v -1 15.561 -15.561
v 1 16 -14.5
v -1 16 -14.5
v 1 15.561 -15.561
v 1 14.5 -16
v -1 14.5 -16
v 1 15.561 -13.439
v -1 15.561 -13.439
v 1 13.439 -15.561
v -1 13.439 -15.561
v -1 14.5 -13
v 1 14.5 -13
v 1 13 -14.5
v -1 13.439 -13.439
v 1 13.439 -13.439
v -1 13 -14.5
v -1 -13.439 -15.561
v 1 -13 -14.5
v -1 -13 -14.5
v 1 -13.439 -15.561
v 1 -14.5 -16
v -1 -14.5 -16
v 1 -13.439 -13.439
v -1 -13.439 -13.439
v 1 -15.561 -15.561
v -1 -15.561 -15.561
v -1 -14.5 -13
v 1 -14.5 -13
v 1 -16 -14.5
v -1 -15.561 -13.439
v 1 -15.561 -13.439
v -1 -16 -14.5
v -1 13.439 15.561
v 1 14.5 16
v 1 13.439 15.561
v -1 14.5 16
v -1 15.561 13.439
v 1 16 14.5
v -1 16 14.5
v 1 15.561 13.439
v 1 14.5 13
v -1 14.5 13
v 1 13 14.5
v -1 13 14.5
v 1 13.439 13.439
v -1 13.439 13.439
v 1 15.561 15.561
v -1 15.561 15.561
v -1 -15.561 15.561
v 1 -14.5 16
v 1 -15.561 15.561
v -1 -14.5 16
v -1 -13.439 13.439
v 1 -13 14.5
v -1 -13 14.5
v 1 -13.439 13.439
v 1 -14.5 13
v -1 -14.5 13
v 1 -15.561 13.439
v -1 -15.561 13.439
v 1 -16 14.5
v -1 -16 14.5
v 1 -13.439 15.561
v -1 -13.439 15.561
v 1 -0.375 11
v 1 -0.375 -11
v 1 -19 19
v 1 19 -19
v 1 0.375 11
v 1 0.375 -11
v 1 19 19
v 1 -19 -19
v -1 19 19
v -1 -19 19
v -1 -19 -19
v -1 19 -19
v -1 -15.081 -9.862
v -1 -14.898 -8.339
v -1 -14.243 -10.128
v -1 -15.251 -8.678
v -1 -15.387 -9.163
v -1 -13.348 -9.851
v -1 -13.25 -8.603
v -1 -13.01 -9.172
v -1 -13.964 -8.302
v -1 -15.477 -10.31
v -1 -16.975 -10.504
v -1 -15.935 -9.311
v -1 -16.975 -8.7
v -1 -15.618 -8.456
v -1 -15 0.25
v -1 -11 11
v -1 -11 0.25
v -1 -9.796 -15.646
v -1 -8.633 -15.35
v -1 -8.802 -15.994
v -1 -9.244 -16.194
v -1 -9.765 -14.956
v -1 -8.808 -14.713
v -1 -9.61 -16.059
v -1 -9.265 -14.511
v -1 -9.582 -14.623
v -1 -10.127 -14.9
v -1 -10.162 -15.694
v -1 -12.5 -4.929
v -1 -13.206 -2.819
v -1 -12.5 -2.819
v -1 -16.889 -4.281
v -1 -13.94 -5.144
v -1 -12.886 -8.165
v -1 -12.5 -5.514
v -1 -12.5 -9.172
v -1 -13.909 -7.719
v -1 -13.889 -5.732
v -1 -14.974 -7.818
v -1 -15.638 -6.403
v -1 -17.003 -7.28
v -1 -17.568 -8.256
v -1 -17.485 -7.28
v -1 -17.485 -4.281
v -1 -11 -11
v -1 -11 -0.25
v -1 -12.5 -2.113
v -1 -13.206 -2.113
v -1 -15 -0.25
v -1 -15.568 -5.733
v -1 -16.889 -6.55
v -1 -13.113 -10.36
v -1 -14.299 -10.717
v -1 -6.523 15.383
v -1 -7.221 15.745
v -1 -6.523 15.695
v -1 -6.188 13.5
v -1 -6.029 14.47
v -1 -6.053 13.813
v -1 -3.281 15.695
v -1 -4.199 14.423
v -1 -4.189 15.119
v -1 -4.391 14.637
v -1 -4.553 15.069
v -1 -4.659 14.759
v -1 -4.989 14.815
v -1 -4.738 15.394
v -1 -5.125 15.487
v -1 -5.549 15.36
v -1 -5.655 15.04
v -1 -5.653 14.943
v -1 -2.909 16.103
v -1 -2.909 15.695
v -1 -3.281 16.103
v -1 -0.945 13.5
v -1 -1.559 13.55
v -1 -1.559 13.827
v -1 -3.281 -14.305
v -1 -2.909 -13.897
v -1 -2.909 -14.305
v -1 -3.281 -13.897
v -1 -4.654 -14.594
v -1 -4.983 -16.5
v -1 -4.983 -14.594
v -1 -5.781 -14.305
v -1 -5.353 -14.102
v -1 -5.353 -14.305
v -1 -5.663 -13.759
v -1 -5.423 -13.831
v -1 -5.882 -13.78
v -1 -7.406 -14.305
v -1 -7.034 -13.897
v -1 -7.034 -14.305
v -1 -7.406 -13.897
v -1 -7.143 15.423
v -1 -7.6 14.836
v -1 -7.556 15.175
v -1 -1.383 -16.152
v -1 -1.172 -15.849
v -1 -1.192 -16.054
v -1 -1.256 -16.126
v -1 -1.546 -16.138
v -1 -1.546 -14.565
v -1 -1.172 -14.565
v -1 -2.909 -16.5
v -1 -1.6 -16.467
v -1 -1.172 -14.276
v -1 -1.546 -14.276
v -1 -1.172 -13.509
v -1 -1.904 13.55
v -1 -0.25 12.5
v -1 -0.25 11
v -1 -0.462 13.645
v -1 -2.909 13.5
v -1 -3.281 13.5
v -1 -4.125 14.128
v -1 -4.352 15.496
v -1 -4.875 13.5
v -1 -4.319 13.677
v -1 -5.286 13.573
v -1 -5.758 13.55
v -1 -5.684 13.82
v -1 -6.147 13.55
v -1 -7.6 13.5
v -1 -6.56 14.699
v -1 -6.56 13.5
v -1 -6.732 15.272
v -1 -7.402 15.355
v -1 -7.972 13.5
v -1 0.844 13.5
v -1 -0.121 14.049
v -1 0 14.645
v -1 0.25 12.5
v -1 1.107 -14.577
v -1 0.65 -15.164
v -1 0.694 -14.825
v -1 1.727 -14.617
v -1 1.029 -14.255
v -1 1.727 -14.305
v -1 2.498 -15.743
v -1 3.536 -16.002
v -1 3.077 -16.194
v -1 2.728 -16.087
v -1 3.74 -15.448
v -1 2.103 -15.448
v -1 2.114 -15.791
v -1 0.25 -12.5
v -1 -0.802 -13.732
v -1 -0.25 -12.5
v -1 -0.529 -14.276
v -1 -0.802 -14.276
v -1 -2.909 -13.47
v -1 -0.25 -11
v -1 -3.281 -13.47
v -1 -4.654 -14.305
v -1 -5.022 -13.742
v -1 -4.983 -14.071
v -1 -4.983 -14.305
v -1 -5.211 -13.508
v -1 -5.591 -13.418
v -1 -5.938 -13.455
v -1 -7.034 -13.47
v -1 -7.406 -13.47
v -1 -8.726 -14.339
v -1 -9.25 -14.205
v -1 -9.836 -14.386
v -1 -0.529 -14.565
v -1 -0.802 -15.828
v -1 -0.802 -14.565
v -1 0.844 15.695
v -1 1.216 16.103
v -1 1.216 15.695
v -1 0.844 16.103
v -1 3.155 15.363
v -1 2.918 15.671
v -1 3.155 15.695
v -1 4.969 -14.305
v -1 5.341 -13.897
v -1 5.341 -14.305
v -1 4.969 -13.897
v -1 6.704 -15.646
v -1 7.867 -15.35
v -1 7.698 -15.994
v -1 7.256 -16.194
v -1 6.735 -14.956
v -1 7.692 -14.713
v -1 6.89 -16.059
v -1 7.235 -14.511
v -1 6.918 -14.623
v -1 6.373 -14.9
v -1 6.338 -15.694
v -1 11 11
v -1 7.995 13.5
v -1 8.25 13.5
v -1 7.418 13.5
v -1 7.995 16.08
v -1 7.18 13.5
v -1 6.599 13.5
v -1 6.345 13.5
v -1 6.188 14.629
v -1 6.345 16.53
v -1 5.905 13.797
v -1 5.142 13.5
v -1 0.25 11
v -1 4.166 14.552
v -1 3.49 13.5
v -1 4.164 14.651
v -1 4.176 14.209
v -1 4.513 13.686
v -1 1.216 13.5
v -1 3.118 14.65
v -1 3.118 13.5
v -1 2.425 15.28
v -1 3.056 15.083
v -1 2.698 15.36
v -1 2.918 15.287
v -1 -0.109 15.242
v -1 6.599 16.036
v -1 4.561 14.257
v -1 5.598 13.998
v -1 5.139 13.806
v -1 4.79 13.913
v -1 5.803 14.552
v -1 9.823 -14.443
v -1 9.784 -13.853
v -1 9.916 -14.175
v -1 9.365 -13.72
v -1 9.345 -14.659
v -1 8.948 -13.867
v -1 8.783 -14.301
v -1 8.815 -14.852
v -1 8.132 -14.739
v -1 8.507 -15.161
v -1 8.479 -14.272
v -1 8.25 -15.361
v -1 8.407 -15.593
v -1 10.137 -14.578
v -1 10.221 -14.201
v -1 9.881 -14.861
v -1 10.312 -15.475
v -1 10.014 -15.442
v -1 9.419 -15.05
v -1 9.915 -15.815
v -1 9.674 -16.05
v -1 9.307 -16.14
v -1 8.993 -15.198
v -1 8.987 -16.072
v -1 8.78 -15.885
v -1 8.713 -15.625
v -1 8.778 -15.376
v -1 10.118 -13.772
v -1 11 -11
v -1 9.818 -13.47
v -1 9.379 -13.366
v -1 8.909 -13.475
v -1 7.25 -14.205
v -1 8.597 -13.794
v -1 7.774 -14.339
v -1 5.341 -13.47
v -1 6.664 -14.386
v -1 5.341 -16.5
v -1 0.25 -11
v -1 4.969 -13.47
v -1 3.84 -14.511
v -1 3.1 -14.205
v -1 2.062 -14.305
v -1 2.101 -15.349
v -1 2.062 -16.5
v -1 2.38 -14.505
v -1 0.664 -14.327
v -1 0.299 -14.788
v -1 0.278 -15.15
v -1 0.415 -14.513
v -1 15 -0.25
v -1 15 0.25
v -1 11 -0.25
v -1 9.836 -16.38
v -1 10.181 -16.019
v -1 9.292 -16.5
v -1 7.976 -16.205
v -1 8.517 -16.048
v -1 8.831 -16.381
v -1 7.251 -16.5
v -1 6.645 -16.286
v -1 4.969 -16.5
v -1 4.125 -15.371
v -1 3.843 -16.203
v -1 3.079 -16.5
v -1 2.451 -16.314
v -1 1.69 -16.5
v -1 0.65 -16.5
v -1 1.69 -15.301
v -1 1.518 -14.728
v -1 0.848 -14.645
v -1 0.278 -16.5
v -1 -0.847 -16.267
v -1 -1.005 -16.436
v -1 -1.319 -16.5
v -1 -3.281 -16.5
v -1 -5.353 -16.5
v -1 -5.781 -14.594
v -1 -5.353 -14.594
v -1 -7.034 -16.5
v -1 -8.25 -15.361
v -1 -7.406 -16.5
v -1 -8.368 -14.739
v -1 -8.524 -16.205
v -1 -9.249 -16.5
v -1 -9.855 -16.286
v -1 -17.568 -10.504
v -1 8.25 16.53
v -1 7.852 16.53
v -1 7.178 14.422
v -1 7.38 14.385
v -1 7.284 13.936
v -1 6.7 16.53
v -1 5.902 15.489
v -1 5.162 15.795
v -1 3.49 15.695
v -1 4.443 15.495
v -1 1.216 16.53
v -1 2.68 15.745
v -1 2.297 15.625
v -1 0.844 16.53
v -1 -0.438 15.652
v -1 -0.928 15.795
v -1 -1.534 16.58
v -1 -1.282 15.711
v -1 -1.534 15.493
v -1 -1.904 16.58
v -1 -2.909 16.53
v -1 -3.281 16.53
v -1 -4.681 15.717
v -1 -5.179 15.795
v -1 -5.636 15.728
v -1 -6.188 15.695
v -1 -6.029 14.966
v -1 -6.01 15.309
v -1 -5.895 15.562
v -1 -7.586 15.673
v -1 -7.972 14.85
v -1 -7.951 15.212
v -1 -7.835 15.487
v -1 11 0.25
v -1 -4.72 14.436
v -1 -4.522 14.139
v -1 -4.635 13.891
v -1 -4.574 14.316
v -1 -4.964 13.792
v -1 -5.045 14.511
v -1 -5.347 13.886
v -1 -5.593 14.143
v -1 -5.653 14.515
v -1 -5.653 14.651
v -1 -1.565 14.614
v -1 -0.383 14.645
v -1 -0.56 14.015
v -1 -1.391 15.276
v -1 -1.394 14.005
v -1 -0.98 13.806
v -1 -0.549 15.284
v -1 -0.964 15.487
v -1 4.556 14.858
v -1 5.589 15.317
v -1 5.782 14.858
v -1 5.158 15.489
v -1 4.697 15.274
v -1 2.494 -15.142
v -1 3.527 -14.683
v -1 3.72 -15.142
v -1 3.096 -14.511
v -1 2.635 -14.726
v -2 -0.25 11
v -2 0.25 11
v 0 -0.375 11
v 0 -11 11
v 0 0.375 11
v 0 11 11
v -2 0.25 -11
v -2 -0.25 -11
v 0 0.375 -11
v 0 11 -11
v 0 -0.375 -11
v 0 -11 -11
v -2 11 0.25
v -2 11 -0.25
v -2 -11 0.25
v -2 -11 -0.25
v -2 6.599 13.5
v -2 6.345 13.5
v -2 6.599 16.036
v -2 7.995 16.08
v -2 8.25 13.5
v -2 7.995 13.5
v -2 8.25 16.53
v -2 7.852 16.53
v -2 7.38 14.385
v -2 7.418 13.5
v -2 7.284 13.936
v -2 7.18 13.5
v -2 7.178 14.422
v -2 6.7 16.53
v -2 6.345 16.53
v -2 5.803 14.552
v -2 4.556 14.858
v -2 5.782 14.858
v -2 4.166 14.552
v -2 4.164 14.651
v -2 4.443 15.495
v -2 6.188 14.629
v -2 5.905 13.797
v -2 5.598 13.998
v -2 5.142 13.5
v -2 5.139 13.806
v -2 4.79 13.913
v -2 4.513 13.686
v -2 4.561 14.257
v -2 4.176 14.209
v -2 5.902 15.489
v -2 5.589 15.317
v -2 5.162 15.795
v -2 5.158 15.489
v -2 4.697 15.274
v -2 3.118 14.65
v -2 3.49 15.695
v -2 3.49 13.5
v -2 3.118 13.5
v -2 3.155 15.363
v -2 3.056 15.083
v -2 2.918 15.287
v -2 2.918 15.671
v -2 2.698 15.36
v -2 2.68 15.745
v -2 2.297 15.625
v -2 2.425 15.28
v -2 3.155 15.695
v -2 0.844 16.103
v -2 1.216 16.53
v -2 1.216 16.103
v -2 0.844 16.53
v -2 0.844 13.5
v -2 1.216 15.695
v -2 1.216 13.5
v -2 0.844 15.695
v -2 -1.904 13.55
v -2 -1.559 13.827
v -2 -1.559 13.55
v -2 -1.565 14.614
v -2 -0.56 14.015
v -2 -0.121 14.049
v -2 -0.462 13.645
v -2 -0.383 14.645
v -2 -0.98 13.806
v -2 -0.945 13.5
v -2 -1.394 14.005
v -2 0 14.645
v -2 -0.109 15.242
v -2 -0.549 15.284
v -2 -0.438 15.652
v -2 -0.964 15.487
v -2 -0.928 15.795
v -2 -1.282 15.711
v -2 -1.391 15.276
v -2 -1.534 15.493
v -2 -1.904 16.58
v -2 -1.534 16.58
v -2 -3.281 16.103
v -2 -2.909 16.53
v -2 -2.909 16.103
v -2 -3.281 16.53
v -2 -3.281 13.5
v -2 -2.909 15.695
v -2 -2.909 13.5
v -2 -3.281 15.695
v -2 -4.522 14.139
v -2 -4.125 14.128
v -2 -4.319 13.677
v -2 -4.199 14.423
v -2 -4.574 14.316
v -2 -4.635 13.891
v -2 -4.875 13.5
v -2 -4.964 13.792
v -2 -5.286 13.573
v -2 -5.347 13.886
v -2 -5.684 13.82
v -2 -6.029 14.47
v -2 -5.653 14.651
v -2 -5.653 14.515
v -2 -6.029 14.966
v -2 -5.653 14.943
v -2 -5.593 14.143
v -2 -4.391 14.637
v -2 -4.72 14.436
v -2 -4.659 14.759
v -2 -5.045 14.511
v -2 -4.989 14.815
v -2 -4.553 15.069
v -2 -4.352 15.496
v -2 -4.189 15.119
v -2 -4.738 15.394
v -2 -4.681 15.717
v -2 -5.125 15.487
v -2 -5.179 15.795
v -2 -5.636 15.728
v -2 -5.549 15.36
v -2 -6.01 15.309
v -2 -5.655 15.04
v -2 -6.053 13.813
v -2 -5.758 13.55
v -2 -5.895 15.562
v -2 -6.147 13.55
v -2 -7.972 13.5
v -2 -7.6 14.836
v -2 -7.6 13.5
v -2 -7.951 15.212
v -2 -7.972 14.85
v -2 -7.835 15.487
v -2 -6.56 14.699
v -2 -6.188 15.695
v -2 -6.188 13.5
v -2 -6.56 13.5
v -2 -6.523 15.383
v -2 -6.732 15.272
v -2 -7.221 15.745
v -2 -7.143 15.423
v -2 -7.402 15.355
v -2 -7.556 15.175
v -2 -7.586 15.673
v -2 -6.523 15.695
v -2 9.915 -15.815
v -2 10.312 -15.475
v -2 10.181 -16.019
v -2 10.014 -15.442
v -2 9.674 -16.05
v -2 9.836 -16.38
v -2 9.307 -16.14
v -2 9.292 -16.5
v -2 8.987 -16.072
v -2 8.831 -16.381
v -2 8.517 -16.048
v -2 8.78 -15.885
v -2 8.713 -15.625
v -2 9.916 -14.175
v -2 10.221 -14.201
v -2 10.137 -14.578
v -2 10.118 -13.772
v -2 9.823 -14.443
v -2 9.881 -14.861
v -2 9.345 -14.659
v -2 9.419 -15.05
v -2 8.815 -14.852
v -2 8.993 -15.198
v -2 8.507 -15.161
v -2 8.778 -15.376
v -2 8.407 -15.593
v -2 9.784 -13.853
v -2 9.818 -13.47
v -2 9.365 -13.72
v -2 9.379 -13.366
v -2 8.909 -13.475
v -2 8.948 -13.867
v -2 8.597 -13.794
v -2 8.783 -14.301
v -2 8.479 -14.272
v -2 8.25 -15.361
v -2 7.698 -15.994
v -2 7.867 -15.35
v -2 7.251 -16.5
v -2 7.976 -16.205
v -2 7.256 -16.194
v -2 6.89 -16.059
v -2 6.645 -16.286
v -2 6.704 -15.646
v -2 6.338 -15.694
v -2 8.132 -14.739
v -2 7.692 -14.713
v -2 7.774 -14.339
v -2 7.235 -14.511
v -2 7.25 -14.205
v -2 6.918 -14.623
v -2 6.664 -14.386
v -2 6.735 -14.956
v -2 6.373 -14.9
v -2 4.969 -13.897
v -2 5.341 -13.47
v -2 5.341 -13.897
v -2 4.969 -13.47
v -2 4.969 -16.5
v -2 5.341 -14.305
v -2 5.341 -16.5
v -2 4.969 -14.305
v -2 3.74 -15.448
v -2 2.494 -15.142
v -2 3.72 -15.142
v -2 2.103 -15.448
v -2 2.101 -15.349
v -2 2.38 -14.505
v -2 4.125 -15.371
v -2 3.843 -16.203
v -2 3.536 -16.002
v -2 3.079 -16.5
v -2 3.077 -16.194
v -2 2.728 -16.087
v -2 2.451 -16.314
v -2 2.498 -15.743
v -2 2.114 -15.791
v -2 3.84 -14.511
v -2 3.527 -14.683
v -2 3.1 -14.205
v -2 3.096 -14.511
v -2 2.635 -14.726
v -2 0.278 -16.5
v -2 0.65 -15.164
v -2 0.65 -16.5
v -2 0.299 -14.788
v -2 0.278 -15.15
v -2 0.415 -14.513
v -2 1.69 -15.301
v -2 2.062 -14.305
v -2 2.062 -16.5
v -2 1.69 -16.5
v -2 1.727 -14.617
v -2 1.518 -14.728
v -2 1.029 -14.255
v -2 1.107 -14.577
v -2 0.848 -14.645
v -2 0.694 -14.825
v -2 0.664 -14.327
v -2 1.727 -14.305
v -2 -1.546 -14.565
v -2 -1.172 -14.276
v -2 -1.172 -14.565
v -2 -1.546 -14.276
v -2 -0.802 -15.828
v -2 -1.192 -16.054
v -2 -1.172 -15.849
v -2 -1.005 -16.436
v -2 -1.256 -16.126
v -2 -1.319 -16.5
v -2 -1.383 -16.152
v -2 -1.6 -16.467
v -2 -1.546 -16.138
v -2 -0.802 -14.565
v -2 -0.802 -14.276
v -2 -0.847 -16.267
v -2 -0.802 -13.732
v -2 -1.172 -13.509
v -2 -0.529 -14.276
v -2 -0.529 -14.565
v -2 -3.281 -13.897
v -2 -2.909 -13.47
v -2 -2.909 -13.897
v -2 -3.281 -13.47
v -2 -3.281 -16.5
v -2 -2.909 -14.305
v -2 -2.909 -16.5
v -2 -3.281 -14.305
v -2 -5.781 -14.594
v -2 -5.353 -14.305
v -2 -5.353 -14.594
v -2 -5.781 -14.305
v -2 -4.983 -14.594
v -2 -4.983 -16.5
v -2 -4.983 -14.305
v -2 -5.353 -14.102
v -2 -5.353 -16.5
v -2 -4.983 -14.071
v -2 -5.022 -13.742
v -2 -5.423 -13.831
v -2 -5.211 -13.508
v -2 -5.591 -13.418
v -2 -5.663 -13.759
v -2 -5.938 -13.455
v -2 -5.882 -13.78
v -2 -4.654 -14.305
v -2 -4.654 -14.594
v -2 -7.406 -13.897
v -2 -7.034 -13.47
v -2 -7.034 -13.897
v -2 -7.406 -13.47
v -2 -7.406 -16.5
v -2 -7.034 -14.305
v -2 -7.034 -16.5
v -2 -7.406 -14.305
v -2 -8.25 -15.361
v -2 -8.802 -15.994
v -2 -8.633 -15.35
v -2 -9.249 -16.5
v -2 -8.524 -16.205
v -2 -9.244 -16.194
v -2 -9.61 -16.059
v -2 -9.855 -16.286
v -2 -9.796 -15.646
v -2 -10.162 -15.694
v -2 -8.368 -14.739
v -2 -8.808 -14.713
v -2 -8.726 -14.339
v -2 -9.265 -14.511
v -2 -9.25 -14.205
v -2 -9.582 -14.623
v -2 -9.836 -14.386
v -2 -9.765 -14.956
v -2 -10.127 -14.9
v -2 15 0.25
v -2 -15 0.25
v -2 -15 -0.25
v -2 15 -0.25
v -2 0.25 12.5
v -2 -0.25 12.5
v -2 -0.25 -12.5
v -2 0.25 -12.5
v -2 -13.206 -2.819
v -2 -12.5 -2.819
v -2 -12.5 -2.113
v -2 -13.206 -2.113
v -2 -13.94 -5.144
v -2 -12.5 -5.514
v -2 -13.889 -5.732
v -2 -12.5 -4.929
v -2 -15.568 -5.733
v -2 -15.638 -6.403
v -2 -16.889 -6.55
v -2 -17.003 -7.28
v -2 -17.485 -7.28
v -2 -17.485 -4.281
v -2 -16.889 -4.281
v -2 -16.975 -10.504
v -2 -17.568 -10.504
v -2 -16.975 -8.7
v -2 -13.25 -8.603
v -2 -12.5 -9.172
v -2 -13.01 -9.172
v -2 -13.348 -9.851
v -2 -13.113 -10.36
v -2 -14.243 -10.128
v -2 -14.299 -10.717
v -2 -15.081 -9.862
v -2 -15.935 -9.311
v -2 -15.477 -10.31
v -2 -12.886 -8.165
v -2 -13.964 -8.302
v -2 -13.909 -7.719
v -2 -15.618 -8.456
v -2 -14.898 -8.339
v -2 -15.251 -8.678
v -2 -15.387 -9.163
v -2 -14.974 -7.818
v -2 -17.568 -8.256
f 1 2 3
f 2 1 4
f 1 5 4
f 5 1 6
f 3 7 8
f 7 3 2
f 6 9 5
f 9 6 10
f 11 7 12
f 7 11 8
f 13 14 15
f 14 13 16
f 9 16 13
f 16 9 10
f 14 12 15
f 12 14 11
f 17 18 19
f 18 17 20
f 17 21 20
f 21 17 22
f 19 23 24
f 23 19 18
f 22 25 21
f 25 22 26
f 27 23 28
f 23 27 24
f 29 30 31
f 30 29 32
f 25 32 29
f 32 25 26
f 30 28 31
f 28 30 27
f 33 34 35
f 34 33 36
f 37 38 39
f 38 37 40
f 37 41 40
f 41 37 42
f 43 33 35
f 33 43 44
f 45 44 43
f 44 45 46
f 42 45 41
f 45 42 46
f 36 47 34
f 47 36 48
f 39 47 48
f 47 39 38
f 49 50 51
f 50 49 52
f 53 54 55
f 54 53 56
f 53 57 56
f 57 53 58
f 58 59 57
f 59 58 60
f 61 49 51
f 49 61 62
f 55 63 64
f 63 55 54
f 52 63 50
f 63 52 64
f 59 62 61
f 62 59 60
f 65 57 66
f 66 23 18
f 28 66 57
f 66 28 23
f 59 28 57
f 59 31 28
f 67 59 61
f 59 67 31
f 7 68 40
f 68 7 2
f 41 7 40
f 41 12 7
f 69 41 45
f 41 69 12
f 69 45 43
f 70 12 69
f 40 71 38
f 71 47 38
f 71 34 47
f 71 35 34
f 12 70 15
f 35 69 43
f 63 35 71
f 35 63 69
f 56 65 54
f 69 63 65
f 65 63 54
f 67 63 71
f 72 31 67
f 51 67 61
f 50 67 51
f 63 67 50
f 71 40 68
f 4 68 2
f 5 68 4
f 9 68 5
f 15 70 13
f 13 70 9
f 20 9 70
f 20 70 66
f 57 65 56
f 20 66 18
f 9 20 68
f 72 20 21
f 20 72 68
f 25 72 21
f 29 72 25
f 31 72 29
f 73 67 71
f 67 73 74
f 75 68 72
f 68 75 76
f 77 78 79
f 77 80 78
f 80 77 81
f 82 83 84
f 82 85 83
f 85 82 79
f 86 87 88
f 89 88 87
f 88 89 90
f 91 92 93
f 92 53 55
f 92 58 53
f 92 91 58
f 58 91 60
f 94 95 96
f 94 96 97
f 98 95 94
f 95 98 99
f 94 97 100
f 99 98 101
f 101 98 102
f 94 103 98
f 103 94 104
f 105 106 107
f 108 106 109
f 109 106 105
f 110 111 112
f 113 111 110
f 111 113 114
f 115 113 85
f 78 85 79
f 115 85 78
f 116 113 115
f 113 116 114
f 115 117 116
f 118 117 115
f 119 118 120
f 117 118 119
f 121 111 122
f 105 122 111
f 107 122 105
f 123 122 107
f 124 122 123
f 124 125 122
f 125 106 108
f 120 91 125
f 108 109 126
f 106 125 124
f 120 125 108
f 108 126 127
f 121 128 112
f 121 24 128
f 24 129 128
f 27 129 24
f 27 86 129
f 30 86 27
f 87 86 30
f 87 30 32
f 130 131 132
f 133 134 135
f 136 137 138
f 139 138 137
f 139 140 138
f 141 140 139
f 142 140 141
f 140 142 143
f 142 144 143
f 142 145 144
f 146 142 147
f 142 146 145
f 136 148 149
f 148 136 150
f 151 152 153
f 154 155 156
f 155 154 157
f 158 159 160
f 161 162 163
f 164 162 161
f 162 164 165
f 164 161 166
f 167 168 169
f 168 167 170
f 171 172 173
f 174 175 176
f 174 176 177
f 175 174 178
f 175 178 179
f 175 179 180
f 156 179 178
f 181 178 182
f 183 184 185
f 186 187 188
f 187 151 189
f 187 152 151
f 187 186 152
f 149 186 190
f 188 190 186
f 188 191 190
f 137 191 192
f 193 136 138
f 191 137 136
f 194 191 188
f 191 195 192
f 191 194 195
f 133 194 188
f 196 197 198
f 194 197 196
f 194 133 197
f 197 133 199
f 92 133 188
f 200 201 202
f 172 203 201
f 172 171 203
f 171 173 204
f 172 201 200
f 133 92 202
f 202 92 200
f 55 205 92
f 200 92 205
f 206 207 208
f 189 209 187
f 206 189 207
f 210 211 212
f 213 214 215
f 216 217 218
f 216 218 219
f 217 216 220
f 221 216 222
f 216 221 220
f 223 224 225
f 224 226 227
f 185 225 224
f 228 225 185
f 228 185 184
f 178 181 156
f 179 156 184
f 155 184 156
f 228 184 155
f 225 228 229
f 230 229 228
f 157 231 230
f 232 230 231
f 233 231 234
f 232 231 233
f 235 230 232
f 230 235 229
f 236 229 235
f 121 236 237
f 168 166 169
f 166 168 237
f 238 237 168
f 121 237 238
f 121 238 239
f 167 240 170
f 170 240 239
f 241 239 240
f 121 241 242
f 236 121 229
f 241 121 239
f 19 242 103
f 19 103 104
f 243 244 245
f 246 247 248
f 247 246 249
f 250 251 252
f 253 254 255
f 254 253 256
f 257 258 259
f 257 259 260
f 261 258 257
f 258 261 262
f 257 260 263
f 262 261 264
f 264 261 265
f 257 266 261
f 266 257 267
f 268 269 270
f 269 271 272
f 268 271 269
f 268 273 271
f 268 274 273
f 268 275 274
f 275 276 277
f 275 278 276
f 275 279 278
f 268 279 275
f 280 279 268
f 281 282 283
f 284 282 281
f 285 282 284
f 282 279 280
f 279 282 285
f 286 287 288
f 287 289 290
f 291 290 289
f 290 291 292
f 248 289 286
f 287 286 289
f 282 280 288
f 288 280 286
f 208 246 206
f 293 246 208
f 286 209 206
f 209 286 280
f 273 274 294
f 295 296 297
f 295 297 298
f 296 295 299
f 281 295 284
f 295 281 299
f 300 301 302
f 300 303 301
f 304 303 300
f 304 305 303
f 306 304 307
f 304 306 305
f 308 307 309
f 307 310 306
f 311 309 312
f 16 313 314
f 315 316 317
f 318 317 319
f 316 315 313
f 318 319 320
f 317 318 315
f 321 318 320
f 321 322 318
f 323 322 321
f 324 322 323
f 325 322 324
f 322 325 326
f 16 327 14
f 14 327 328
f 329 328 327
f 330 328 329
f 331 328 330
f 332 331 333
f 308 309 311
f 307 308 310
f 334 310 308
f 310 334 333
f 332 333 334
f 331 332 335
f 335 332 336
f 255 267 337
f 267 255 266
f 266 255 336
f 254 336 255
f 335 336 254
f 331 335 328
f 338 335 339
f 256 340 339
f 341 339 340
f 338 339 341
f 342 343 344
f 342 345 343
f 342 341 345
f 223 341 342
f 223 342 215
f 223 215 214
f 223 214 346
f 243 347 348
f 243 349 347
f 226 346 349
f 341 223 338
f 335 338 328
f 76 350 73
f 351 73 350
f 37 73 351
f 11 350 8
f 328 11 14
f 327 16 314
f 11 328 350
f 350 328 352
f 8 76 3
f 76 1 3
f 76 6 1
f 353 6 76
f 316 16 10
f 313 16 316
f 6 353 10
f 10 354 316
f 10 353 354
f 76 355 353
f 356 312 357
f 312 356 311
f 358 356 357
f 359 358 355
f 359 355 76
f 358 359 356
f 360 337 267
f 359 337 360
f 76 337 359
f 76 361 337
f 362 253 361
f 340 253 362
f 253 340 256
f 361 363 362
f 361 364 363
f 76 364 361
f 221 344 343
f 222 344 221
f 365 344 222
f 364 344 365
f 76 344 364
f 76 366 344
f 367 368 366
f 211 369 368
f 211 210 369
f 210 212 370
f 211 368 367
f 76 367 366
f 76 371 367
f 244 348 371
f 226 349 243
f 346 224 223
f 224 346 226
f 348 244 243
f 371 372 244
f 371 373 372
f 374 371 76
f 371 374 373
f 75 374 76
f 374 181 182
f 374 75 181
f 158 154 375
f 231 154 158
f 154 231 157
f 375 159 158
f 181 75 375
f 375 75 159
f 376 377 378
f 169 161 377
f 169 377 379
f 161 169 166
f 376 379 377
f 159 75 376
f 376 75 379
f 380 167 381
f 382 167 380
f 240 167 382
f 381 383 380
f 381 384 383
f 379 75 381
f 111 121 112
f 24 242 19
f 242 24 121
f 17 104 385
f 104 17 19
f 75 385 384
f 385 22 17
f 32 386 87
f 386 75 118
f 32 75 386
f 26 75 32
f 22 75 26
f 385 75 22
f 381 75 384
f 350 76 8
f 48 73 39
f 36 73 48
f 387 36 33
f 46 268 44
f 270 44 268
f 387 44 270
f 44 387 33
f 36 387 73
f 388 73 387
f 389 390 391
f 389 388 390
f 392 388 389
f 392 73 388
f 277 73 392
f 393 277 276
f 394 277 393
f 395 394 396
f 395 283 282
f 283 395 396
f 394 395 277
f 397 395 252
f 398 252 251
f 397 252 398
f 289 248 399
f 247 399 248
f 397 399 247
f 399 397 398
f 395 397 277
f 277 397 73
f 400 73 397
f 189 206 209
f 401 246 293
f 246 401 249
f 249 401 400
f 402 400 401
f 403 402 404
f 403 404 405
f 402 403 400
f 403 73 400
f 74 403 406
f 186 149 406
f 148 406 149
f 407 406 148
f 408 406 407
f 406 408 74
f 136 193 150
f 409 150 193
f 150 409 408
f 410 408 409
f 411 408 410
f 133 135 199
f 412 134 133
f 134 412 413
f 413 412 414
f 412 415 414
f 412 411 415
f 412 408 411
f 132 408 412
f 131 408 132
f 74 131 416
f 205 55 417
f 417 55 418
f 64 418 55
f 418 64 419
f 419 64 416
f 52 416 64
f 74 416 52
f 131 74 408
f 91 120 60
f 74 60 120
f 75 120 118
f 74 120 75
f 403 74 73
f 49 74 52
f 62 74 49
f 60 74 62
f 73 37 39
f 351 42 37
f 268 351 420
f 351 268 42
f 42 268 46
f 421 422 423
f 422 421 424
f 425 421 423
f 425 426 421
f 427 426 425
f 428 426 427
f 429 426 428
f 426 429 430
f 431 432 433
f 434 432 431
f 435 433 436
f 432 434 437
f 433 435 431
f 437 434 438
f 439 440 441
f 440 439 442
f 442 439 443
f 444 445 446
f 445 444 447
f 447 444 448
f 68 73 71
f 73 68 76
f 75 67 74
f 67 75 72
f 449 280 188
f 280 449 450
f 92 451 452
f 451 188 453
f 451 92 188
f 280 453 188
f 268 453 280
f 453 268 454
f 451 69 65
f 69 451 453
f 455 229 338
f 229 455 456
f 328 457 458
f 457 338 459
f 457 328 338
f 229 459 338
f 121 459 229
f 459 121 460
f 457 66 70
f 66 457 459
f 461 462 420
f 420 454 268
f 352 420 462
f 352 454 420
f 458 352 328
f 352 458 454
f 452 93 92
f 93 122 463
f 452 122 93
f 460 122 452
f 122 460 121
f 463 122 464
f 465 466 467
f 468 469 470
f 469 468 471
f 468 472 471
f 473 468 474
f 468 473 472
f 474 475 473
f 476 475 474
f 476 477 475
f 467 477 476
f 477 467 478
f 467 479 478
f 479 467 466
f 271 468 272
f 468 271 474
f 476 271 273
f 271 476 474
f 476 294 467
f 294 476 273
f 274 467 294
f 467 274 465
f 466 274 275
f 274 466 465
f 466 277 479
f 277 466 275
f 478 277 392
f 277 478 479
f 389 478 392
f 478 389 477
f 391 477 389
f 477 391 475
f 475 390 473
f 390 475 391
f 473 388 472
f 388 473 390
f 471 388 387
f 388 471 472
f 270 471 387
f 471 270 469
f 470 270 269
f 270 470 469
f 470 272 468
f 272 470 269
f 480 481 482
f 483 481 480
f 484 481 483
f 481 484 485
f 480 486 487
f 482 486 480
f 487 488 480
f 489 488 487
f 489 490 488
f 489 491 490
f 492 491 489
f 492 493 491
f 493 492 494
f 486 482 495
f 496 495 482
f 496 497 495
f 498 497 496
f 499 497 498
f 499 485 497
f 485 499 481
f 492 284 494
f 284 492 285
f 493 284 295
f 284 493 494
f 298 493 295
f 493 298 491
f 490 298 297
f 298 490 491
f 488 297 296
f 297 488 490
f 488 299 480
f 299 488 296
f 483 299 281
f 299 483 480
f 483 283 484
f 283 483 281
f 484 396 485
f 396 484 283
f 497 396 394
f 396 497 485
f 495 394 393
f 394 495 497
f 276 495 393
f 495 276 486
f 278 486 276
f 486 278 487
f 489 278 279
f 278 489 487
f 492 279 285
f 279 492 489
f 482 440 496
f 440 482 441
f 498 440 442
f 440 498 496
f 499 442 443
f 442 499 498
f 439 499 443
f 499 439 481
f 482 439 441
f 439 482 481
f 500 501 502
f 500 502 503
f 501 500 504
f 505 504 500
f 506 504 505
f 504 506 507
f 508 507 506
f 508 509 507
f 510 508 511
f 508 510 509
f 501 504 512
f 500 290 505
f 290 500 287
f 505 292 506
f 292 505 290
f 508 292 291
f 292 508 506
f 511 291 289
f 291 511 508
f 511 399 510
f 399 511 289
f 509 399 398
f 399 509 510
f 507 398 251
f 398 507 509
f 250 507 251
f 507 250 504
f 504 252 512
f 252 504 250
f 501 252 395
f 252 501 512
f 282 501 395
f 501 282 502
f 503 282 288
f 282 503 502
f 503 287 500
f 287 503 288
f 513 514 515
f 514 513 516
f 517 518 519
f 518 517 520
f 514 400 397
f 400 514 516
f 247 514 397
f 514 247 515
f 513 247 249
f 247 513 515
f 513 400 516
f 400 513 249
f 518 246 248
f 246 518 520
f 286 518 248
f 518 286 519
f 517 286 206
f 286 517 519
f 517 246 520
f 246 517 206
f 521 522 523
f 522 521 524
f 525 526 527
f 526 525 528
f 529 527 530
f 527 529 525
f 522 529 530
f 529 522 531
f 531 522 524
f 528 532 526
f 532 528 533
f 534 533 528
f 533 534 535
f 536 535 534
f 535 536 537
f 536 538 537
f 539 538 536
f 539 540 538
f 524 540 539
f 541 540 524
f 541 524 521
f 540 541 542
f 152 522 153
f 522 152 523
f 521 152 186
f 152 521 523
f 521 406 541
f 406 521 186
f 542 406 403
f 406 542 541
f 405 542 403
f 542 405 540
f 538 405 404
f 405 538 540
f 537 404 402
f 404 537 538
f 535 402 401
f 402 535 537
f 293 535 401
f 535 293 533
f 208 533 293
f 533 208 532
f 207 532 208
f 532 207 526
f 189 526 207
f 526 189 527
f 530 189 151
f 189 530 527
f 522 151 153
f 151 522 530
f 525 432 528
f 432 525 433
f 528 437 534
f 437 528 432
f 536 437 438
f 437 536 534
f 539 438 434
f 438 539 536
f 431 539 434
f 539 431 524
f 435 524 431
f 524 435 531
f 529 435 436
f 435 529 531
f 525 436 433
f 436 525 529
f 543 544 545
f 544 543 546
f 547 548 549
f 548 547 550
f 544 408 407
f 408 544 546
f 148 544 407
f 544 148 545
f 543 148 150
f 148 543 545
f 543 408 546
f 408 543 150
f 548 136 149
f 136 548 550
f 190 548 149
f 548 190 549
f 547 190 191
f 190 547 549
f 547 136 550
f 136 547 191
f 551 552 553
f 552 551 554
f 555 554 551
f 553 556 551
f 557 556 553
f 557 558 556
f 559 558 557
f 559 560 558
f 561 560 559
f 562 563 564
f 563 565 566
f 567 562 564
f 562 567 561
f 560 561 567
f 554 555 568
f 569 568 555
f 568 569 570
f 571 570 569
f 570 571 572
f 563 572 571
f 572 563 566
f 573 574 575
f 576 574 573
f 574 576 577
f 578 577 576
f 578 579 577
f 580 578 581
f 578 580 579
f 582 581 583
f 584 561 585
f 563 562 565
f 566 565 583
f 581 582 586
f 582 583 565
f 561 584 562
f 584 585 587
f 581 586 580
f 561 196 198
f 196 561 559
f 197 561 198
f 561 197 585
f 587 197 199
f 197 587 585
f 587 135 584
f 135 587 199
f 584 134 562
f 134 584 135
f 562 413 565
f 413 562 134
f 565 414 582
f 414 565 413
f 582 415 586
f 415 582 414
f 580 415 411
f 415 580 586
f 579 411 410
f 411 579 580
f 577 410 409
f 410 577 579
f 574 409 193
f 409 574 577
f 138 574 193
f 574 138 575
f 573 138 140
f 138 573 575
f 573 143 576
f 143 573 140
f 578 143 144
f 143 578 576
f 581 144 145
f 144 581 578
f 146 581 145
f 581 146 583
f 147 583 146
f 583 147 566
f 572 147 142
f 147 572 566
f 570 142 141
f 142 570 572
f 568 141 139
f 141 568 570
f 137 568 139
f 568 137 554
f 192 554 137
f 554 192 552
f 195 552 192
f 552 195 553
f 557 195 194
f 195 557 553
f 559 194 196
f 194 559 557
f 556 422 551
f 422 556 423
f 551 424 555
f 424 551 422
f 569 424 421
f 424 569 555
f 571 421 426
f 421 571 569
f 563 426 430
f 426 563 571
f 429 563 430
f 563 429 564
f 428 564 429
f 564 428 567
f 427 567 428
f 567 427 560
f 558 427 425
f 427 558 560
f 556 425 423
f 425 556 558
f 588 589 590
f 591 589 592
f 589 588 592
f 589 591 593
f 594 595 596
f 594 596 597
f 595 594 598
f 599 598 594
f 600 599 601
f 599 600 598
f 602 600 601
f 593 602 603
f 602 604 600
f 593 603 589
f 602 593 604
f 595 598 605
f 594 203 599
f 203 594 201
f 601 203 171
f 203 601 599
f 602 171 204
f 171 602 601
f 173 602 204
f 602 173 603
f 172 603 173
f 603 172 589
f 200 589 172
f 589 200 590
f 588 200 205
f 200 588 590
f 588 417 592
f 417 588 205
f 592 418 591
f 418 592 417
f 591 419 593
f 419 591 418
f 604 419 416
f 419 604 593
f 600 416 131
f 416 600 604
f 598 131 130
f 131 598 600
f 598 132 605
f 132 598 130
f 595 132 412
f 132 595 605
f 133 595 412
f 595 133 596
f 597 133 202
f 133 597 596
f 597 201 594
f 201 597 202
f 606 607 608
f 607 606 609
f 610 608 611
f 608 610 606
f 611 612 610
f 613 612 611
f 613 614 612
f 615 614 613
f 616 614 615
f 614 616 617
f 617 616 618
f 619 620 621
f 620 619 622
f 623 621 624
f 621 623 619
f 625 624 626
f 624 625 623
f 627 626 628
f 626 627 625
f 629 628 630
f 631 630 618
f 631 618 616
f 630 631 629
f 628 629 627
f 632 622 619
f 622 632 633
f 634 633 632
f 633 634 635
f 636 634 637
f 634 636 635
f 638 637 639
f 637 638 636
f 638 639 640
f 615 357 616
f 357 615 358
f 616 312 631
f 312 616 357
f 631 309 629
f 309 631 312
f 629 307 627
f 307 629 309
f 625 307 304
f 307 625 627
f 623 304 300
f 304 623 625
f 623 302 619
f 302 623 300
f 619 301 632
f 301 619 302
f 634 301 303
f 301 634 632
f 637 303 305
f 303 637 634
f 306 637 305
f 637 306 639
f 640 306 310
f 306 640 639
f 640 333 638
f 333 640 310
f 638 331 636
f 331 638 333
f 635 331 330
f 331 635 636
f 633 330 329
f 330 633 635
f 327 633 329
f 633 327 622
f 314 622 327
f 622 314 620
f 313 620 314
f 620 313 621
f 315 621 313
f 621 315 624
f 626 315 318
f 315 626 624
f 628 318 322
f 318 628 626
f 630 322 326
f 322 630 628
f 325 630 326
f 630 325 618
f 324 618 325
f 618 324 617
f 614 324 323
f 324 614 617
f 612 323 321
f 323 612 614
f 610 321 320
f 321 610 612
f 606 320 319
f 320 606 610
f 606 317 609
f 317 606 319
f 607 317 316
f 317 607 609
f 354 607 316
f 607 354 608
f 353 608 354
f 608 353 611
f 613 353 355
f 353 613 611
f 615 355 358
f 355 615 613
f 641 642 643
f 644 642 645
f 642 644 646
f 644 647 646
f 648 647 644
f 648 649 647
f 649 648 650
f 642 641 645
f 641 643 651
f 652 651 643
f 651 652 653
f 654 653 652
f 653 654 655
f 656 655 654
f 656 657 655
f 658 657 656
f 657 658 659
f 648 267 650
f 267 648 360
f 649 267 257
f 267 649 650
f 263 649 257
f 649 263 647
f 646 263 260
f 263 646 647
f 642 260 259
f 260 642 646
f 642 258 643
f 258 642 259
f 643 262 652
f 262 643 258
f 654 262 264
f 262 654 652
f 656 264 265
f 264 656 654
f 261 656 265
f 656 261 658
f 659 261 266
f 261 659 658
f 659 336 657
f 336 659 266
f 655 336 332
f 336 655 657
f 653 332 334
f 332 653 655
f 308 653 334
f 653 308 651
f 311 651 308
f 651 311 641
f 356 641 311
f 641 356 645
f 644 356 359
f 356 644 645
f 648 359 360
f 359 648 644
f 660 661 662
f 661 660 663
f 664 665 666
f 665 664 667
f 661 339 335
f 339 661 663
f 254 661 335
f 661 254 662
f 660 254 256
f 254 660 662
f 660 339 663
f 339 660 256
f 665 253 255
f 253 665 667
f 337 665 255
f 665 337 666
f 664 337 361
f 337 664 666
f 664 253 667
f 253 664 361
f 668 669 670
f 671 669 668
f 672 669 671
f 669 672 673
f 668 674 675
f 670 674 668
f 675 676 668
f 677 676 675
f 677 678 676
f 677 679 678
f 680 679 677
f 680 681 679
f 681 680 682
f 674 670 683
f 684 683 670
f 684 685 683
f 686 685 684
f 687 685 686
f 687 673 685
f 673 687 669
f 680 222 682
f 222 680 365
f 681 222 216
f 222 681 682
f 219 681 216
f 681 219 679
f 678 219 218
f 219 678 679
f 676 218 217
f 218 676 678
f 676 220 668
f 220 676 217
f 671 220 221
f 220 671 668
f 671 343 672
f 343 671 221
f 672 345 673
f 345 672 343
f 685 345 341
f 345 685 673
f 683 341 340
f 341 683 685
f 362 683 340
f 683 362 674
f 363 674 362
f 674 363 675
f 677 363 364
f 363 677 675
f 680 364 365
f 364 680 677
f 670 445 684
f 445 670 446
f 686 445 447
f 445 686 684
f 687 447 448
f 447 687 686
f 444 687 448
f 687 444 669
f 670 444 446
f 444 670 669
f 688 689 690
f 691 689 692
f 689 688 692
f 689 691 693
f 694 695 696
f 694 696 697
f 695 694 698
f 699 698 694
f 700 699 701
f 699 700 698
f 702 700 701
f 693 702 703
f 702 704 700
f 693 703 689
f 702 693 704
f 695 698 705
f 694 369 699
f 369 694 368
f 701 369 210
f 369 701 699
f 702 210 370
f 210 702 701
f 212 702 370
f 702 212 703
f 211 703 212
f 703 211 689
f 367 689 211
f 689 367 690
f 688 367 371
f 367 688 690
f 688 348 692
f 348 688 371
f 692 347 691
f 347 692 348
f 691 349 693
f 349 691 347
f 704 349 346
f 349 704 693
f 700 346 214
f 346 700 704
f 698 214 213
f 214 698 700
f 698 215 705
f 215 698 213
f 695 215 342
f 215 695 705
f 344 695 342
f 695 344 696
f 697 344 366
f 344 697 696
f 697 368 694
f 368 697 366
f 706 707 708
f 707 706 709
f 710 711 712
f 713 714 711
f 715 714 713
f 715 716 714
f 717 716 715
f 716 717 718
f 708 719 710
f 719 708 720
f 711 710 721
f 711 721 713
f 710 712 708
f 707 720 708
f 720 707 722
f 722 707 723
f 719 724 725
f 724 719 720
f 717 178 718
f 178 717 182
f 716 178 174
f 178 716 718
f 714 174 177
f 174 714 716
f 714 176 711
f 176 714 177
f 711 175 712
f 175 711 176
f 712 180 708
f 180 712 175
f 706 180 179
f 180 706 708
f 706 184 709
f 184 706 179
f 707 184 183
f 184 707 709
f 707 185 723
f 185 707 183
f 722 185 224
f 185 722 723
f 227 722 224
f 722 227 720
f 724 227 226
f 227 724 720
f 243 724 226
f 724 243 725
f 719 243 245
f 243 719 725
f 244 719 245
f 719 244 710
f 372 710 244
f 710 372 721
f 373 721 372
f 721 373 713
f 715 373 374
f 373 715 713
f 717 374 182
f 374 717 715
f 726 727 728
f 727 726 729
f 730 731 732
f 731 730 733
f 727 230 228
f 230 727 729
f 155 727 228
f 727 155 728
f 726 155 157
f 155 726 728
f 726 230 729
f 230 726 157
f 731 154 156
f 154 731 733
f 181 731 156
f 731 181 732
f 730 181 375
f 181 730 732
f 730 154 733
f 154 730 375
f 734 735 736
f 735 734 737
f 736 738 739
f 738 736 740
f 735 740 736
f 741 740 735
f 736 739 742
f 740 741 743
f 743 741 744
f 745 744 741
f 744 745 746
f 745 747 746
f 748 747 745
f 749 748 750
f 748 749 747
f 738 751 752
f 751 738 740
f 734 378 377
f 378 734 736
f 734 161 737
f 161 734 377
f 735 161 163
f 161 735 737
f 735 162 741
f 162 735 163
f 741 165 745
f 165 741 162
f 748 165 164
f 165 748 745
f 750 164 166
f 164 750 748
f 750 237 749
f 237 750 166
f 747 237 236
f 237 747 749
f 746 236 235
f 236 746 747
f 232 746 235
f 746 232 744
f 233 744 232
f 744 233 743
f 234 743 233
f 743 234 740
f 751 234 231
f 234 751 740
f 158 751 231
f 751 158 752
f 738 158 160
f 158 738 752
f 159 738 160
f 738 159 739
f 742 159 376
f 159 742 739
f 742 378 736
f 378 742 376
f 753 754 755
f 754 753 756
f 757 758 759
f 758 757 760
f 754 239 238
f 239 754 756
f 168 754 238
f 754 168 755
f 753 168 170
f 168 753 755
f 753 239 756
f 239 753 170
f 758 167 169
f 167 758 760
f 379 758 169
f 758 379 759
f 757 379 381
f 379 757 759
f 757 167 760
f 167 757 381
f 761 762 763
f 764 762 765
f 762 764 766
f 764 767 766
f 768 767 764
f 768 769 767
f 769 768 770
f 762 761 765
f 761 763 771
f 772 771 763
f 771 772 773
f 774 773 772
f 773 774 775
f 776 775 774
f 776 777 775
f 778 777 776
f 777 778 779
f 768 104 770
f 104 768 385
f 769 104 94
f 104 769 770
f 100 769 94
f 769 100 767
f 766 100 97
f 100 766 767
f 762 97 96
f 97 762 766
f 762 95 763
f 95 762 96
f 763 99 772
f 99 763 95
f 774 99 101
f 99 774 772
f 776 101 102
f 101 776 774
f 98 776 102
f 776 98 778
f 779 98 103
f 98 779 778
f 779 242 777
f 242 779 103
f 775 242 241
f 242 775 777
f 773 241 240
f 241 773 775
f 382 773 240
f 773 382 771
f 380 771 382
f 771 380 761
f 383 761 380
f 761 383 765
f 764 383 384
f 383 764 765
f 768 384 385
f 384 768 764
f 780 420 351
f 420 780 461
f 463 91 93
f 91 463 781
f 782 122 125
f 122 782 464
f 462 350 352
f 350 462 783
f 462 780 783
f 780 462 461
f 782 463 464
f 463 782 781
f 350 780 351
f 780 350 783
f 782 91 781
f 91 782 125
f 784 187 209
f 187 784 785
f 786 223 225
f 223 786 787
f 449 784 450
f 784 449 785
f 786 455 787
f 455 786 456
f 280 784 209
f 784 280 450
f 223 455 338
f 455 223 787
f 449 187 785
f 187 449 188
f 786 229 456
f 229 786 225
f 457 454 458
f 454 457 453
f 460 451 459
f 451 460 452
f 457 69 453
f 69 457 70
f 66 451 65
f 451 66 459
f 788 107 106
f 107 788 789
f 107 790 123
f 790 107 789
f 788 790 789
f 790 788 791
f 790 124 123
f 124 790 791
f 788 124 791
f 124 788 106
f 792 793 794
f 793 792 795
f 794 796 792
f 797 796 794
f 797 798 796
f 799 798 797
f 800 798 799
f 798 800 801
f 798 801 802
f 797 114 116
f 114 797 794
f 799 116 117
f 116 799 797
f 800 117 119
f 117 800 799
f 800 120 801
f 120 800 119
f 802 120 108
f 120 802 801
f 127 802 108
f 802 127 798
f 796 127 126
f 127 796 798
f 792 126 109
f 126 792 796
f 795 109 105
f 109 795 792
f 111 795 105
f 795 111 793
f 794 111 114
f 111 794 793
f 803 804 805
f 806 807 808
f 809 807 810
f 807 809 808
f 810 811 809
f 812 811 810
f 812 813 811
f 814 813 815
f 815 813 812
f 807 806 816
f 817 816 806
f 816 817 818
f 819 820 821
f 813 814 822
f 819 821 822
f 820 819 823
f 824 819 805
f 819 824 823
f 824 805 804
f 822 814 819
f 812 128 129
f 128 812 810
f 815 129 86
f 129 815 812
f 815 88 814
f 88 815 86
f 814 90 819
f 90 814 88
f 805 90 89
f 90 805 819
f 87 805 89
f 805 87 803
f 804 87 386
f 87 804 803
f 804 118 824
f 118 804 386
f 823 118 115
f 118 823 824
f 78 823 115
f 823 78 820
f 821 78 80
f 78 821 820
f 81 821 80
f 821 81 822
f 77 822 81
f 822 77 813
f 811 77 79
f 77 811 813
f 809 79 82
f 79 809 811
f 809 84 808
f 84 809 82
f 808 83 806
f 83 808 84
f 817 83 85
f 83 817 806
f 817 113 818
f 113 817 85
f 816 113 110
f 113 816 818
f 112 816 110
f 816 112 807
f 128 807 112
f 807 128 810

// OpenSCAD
// file: opticsMount_retainingBracket.scad
use <write.scad>

module retainingBracket(){
	difference(){	
		translate([0,0,0]) color([.7,.9,.2]) cube(size=[2,38,38],center=true);
		translate([0,0,0]) cube(size=[6,22,22],center=true);
		rotate([0,90,0]){
			translate([14.5,14.5,0]) cylinder(h=5,r=1.5,$fn=8,center=true);			
			translate([14.5,-14.5,0]) cylinder(h=5,r=1.5,$fn=8,center=true);			
			translate([-14.5,14.5,0]) cylinder(h=5,r=1.5,$fn=8,center=true);			
			translate([-14.5,-14.5,0]) cylinder(h=5,r=1.5,$fn=8,center=true);		
		}
	}
	rotate([90,0,-90]){
		translate([0,15,1]){
			write("Meridian",h=3,t=2,center=true);
		}
	}
	rotate([90,0,-90]){
		translate([0,-15,1]){
			write("Scientific",h=3,t=2,center=true);
		}
	}
	difference(){
		translate([-1,0,0]) cube(size=[2,30,.5],center=true);	
		translate([0,0,0]) cube(size=[6,22,22],center=true);
	}
	difference(){
		translate([-1,0,0]) cube(size=[2,.5,25],center=true);	
		translate([0,0,0]) cube(size=[6,22,22],center=true);
	}
}

retainingBracket();
// main file
use <write.scad>
use <opticsMount_retainingBracket.scad>

module aperture(){
	difference(){
		translate([.5,0,0]) color([0.3,0.5,0.9]) cube(size=[1,22,22],center=true);
		translate([.5,0,0]) cube(size=[2,.75,22],center=true);
	}
	rotate([90,90,-90]){
		translate([6,15,1]){
			write(".75",h=5,t=2,center=true);
		}
	}
}

translate([0,0,0]){
	retainingBracket();
	aperture();
}
